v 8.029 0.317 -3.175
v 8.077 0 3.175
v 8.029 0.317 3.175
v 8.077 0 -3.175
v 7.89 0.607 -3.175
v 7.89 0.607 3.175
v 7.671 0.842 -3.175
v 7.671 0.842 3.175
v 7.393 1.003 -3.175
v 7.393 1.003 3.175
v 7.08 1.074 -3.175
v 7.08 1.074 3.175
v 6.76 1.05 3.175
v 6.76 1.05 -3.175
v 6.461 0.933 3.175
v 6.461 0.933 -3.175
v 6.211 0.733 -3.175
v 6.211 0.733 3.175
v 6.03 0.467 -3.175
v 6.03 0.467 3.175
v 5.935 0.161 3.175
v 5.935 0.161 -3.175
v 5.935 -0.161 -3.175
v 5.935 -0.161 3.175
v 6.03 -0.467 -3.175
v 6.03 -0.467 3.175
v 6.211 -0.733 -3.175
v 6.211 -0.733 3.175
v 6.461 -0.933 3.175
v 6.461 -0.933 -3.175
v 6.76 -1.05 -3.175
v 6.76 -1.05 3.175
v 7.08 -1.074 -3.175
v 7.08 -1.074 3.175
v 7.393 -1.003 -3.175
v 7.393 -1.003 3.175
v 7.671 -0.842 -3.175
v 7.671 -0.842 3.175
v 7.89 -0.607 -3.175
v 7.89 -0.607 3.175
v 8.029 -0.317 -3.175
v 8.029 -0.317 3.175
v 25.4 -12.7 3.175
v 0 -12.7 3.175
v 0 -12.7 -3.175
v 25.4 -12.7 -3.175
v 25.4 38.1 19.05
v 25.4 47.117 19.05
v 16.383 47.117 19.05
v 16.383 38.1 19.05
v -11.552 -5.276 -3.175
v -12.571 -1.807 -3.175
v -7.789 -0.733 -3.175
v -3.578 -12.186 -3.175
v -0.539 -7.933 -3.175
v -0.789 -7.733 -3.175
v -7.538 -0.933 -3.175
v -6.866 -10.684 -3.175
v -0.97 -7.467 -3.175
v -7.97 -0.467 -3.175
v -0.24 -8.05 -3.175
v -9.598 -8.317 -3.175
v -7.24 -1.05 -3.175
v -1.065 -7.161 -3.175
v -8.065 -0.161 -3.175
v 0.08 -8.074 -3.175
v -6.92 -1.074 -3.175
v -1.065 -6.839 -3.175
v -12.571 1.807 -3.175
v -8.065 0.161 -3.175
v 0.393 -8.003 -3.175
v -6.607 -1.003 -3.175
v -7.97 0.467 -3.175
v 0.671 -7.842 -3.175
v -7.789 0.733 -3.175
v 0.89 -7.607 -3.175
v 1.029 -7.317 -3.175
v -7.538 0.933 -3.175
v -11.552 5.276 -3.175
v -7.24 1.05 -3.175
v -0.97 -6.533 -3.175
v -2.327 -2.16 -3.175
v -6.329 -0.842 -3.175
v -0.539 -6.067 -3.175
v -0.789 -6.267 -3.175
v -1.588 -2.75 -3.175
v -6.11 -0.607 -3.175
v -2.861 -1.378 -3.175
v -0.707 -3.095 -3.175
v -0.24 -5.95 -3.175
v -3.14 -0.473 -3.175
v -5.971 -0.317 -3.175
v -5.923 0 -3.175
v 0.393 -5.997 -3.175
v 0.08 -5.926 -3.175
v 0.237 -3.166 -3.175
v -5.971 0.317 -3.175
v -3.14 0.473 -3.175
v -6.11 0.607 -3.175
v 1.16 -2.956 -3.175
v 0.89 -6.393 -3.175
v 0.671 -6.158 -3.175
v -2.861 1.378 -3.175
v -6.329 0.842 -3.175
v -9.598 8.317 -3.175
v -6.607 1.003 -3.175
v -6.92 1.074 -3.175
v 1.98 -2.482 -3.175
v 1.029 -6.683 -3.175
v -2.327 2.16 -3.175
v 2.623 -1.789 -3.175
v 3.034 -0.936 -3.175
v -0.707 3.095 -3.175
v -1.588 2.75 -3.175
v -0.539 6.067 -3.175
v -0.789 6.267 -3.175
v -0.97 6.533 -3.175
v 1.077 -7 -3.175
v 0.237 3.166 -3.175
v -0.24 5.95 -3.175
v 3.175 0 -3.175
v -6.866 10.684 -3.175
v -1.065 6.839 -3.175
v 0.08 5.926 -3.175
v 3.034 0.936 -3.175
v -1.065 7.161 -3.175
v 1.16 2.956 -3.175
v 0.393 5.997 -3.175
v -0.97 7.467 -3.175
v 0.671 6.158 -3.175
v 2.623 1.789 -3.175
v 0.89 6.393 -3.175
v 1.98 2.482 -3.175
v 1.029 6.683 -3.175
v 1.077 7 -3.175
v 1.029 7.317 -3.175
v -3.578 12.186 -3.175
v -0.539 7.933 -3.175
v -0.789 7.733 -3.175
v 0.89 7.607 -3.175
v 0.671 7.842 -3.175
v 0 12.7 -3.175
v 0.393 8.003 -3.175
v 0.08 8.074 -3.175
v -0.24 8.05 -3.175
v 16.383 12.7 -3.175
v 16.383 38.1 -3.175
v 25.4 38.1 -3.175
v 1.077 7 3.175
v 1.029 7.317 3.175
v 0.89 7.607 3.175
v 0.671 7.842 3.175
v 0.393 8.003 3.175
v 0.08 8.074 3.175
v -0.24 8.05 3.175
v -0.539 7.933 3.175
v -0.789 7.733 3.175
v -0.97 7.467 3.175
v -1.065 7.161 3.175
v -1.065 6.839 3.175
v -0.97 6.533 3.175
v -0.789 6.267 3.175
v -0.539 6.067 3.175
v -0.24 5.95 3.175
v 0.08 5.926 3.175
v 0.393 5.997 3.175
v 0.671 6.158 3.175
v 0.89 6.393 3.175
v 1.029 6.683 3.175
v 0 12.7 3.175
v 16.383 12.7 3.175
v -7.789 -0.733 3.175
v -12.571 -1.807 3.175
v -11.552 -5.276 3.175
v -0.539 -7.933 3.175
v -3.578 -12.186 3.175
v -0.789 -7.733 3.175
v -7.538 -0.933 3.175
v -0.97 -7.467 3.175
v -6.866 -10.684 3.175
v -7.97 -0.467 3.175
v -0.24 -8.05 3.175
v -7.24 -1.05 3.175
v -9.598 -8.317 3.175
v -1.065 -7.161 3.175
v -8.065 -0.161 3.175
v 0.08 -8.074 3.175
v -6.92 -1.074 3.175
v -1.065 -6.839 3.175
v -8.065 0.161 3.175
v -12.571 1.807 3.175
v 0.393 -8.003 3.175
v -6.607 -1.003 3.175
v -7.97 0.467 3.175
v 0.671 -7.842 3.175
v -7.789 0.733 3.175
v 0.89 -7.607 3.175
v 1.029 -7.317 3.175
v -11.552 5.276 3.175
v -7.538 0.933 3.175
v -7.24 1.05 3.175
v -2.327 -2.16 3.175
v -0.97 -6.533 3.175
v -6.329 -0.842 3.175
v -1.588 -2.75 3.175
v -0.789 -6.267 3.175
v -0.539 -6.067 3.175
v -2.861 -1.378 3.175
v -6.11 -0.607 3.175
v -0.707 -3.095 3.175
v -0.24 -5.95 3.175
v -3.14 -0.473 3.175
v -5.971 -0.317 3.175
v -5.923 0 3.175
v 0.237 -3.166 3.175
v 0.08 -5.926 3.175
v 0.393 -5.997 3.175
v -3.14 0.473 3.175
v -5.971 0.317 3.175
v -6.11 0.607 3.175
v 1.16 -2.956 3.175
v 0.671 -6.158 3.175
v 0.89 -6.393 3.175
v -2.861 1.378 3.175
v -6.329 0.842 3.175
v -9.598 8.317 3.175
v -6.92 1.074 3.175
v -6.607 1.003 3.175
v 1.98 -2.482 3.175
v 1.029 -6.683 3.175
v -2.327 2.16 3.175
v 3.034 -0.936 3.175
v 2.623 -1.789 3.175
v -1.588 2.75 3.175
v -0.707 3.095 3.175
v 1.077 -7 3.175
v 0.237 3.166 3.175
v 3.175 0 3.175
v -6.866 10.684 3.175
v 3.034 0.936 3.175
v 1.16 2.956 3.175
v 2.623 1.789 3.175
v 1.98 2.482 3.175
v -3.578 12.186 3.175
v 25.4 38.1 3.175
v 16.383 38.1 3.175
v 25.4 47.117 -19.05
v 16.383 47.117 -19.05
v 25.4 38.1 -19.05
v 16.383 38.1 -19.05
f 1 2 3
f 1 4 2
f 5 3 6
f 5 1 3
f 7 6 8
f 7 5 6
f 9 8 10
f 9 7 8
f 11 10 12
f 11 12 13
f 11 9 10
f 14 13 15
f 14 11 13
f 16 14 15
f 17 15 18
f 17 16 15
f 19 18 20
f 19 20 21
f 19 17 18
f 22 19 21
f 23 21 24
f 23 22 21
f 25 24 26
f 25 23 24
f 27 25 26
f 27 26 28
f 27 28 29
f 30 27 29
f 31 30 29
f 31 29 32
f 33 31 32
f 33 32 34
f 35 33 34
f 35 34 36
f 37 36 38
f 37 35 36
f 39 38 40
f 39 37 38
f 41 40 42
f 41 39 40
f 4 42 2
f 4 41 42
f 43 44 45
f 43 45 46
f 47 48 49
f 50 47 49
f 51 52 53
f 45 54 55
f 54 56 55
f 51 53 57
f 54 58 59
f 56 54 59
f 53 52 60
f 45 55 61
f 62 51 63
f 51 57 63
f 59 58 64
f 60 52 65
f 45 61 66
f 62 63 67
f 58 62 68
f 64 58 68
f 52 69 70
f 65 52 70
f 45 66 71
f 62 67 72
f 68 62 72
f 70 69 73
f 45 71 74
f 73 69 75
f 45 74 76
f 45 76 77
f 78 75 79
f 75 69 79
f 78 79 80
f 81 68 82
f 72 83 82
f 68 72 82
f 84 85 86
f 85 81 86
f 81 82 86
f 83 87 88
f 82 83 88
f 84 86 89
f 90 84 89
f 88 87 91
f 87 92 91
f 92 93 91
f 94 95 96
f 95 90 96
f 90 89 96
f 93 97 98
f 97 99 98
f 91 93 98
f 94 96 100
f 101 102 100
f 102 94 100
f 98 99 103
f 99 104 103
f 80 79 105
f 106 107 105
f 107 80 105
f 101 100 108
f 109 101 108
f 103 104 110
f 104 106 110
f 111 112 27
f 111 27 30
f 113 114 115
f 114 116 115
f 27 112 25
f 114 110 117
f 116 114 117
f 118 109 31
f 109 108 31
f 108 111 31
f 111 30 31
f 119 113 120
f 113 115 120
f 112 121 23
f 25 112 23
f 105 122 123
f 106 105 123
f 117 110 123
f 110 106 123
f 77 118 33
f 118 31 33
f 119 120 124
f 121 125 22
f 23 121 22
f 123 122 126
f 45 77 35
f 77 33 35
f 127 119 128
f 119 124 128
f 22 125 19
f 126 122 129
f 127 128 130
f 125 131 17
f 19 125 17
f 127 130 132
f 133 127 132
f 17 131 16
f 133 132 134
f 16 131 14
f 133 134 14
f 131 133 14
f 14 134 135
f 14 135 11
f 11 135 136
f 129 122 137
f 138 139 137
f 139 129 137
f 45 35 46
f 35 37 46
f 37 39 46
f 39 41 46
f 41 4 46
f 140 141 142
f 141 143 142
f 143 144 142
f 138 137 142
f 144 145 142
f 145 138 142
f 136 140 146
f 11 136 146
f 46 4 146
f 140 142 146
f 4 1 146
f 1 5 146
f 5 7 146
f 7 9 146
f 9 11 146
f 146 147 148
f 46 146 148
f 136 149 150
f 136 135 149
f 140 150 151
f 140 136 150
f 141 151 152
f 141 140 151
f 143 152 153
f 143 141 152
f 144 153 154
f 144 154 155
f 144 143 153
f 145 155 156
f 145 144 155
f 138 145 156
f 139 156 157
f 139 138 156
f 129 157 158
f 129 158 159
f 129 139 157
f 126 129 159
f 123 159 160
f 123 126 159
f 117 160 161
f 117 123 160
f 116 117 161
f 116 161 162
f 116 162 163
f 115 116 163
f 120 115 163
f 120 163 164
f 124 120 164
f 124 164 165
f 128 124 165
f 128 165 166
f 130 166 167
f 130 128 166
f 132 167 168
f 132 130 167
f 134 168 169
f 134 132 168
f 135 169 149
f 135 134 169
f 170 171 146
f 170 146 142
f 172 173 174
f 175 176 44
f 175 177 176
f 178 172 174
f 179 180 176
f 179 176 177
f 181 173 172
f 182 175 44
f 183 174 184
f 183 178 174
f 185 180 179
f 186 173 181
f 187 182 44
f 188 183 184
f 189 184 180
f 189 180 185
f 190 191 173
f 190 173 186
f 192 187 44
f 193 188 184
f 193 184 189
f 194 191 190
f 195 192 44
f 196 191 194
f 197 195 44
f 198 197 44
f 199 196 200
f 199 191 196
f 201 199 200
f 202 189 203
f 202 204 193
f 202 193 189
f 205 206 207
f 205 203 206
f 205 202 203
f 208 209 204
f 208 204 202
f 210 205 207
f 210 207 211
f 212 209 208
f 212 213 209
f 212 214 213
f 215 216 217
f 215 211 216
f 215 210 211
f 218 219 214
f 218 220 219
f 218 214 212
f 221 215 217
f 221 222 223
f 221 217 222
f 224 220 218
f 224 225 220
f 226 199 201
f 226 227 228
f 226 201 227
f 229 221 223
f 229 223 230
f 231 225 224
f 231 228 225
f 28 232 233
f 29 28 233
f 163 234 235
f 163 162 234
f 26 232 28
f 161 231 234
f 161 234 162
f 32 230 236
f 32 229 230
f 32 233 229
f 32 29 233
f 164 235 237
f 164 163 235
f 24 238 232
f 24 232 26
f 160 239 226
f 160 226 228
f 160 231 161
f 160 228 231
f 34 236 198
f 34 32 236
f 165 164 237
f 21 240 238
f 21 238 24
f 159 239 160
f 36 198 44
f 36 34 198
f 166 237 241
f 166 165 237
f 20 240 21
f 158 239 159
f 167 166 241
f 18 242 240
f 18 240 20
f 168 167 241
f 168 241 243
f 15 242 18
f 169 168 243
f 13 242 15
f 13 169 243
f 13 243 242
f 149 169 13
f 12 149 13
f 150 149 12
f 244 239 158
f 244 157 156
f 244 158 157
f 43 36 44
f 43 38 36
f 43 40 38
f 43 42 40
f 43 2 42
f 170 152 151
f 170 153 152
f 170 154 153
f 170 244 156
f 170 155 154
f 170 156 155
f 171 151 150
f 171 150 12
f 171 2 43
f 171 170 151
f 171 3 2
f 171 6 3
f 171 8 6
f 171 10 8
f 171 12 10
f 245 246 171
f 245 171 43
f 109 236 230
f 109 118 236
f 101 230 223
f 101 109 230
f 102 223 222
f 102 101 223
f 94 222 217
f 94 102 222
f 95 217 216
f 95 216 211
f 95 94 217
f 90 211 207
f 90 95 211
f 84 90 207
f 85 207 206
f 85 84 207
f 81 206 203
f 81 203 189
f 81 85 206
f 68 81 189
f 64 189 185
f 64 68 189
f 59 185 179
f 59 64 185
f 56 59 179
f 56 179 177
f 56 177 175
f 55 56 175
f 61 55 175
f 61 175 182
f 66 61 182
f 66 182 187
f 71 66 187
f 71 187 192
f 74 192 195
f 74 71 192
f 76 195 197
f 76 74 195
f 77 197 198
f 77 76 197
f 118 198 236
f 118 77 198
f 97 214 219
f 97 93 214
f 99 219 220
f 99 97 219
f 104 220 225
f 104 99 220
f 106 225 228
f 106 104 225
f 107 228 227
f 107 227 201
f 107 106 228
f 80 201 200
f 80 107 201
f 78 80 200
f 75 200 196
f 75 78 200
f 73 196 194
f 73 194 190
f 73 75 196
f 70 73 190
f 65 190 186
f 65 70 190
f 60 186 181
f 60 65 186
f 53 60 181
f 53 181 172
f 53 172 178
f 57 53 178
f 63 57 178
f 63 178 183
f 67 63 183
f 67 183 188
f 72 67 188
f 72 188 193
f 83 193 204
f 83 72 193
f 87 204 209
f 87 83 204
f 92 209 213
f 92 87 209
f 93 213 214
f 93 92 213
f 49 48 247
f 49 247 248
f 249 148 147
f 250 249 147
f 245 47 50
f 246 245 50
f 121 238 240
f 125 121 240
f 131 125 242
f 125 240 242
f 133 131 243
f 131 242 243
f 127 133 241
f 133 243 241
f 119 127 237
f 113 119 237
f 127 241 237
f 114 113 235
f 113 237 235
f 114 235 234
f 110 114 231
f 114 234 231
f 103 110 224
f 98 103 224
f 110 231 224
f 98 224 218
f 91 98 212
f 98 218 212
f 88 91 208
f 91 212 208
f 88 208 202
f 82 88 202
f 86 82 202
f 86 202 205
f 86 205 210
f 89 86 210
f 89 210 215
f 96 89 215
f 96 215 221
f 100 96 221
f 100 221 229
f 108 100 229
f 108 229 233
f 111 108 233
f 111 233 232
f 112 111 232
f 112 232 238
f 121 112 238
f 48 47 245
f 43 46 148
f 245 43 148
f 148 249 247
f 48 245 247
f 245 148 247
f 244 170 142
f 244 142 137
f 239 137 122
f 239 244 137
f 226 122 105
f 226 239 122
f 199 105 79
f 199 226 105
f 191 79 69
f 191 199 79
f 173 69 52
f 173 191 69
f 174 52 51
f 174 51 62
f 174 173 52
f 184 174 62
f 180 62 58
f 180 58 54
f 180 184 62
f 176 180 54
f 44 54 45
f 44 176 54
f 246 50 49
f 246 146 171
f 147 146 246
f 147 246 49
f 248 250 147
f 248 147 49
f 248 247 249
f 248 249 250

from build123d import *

# Parameters (mm, degrees)
SKETCH2_R           = 12.7
SKETCH2_R_2         = 1.077000005
BOSS_EXTRUDE1_DEPTH = 3.175
SKETCH3_W           = 9.017
SKETCH3_H           = 9.017
BOSS_EXTRUDE2_DEPTH = 19.05
SKETCH4_R           = 3.175
CUT_EXTRUDE1_DEPTH  = 58.957935729


with BuildPart() as part:
    # Sketch2 → Boss-Extrude1 (new, symmetric)
    # profile 1 of 2: a face of its own
    with BuildSketch(Plane.XY):
        with BuildLine():
            Line((25.4, 47.117), (16.383, 47.117))
            Line((16.383, 47.117), (16.383, 12.7))
            Line((16.383, 12.7), (0, 12.7))
            ThreePointArc((0, 12.7), (8.980256121, 8.980256121), (12.7, 0))
            ThreePointArc((12.7, 0), (8.980256121, -8.980256121), (0, -12.7))
            Line((0, -12.7), (25.4, -12.7))
            Line((25.4, -12.7), (25.4, 47.117))
        make_face()
    # profile 2 of 2: a face of its own
    with BuildSketch(Plane.XY):
        Circle(SKETCH2_R)
        with Locations((0, 6.99999997)):
            Circle(SKETCH2_R_2, mode=Mode.SUBTRACT)
        with Locations((-6.99999997, 0)):
            Circle(SKETCH2_R_2, mode=Mode.SUBTRACT)
        with Locations((0, -6.99999997)):
            Circle(SKETCH2_R_2, mode=Mode.SUBTRACT)
        with Locations((6.99999997, 0)):
            Circle(SKETCH2_R_2, mode=Mode.SUBTRACT)
    extrude(amount=BOSS_EXTRUDE1_DEPTH, both=True)

    # Sketch3 → Boss-Extrude2 (add, symmetric)
    with BuildSketch(Plane(origin=(0, 0, 0), x_dir=(-1, 0, 0), z_dir=(0, 0, -1))):
        with Locations((-20.8915, 42.6085)):
            Rectangle(SKETCH3_W, SKETCH3_H)
    extrude(amount=BOSS_EXTRUDE2_DEPTH, both=True)

    # Sketch4 → Cut-Extrude1 (cut, through all)
    with BuildSketch(Plane.XY.offset(3.175)):
        Circle(SKETCH4_R)
    extrude(amount=-CUT_EXTRUDE1_DEPTH, mode=Mode.SUBTRACT)


solid = part.part
